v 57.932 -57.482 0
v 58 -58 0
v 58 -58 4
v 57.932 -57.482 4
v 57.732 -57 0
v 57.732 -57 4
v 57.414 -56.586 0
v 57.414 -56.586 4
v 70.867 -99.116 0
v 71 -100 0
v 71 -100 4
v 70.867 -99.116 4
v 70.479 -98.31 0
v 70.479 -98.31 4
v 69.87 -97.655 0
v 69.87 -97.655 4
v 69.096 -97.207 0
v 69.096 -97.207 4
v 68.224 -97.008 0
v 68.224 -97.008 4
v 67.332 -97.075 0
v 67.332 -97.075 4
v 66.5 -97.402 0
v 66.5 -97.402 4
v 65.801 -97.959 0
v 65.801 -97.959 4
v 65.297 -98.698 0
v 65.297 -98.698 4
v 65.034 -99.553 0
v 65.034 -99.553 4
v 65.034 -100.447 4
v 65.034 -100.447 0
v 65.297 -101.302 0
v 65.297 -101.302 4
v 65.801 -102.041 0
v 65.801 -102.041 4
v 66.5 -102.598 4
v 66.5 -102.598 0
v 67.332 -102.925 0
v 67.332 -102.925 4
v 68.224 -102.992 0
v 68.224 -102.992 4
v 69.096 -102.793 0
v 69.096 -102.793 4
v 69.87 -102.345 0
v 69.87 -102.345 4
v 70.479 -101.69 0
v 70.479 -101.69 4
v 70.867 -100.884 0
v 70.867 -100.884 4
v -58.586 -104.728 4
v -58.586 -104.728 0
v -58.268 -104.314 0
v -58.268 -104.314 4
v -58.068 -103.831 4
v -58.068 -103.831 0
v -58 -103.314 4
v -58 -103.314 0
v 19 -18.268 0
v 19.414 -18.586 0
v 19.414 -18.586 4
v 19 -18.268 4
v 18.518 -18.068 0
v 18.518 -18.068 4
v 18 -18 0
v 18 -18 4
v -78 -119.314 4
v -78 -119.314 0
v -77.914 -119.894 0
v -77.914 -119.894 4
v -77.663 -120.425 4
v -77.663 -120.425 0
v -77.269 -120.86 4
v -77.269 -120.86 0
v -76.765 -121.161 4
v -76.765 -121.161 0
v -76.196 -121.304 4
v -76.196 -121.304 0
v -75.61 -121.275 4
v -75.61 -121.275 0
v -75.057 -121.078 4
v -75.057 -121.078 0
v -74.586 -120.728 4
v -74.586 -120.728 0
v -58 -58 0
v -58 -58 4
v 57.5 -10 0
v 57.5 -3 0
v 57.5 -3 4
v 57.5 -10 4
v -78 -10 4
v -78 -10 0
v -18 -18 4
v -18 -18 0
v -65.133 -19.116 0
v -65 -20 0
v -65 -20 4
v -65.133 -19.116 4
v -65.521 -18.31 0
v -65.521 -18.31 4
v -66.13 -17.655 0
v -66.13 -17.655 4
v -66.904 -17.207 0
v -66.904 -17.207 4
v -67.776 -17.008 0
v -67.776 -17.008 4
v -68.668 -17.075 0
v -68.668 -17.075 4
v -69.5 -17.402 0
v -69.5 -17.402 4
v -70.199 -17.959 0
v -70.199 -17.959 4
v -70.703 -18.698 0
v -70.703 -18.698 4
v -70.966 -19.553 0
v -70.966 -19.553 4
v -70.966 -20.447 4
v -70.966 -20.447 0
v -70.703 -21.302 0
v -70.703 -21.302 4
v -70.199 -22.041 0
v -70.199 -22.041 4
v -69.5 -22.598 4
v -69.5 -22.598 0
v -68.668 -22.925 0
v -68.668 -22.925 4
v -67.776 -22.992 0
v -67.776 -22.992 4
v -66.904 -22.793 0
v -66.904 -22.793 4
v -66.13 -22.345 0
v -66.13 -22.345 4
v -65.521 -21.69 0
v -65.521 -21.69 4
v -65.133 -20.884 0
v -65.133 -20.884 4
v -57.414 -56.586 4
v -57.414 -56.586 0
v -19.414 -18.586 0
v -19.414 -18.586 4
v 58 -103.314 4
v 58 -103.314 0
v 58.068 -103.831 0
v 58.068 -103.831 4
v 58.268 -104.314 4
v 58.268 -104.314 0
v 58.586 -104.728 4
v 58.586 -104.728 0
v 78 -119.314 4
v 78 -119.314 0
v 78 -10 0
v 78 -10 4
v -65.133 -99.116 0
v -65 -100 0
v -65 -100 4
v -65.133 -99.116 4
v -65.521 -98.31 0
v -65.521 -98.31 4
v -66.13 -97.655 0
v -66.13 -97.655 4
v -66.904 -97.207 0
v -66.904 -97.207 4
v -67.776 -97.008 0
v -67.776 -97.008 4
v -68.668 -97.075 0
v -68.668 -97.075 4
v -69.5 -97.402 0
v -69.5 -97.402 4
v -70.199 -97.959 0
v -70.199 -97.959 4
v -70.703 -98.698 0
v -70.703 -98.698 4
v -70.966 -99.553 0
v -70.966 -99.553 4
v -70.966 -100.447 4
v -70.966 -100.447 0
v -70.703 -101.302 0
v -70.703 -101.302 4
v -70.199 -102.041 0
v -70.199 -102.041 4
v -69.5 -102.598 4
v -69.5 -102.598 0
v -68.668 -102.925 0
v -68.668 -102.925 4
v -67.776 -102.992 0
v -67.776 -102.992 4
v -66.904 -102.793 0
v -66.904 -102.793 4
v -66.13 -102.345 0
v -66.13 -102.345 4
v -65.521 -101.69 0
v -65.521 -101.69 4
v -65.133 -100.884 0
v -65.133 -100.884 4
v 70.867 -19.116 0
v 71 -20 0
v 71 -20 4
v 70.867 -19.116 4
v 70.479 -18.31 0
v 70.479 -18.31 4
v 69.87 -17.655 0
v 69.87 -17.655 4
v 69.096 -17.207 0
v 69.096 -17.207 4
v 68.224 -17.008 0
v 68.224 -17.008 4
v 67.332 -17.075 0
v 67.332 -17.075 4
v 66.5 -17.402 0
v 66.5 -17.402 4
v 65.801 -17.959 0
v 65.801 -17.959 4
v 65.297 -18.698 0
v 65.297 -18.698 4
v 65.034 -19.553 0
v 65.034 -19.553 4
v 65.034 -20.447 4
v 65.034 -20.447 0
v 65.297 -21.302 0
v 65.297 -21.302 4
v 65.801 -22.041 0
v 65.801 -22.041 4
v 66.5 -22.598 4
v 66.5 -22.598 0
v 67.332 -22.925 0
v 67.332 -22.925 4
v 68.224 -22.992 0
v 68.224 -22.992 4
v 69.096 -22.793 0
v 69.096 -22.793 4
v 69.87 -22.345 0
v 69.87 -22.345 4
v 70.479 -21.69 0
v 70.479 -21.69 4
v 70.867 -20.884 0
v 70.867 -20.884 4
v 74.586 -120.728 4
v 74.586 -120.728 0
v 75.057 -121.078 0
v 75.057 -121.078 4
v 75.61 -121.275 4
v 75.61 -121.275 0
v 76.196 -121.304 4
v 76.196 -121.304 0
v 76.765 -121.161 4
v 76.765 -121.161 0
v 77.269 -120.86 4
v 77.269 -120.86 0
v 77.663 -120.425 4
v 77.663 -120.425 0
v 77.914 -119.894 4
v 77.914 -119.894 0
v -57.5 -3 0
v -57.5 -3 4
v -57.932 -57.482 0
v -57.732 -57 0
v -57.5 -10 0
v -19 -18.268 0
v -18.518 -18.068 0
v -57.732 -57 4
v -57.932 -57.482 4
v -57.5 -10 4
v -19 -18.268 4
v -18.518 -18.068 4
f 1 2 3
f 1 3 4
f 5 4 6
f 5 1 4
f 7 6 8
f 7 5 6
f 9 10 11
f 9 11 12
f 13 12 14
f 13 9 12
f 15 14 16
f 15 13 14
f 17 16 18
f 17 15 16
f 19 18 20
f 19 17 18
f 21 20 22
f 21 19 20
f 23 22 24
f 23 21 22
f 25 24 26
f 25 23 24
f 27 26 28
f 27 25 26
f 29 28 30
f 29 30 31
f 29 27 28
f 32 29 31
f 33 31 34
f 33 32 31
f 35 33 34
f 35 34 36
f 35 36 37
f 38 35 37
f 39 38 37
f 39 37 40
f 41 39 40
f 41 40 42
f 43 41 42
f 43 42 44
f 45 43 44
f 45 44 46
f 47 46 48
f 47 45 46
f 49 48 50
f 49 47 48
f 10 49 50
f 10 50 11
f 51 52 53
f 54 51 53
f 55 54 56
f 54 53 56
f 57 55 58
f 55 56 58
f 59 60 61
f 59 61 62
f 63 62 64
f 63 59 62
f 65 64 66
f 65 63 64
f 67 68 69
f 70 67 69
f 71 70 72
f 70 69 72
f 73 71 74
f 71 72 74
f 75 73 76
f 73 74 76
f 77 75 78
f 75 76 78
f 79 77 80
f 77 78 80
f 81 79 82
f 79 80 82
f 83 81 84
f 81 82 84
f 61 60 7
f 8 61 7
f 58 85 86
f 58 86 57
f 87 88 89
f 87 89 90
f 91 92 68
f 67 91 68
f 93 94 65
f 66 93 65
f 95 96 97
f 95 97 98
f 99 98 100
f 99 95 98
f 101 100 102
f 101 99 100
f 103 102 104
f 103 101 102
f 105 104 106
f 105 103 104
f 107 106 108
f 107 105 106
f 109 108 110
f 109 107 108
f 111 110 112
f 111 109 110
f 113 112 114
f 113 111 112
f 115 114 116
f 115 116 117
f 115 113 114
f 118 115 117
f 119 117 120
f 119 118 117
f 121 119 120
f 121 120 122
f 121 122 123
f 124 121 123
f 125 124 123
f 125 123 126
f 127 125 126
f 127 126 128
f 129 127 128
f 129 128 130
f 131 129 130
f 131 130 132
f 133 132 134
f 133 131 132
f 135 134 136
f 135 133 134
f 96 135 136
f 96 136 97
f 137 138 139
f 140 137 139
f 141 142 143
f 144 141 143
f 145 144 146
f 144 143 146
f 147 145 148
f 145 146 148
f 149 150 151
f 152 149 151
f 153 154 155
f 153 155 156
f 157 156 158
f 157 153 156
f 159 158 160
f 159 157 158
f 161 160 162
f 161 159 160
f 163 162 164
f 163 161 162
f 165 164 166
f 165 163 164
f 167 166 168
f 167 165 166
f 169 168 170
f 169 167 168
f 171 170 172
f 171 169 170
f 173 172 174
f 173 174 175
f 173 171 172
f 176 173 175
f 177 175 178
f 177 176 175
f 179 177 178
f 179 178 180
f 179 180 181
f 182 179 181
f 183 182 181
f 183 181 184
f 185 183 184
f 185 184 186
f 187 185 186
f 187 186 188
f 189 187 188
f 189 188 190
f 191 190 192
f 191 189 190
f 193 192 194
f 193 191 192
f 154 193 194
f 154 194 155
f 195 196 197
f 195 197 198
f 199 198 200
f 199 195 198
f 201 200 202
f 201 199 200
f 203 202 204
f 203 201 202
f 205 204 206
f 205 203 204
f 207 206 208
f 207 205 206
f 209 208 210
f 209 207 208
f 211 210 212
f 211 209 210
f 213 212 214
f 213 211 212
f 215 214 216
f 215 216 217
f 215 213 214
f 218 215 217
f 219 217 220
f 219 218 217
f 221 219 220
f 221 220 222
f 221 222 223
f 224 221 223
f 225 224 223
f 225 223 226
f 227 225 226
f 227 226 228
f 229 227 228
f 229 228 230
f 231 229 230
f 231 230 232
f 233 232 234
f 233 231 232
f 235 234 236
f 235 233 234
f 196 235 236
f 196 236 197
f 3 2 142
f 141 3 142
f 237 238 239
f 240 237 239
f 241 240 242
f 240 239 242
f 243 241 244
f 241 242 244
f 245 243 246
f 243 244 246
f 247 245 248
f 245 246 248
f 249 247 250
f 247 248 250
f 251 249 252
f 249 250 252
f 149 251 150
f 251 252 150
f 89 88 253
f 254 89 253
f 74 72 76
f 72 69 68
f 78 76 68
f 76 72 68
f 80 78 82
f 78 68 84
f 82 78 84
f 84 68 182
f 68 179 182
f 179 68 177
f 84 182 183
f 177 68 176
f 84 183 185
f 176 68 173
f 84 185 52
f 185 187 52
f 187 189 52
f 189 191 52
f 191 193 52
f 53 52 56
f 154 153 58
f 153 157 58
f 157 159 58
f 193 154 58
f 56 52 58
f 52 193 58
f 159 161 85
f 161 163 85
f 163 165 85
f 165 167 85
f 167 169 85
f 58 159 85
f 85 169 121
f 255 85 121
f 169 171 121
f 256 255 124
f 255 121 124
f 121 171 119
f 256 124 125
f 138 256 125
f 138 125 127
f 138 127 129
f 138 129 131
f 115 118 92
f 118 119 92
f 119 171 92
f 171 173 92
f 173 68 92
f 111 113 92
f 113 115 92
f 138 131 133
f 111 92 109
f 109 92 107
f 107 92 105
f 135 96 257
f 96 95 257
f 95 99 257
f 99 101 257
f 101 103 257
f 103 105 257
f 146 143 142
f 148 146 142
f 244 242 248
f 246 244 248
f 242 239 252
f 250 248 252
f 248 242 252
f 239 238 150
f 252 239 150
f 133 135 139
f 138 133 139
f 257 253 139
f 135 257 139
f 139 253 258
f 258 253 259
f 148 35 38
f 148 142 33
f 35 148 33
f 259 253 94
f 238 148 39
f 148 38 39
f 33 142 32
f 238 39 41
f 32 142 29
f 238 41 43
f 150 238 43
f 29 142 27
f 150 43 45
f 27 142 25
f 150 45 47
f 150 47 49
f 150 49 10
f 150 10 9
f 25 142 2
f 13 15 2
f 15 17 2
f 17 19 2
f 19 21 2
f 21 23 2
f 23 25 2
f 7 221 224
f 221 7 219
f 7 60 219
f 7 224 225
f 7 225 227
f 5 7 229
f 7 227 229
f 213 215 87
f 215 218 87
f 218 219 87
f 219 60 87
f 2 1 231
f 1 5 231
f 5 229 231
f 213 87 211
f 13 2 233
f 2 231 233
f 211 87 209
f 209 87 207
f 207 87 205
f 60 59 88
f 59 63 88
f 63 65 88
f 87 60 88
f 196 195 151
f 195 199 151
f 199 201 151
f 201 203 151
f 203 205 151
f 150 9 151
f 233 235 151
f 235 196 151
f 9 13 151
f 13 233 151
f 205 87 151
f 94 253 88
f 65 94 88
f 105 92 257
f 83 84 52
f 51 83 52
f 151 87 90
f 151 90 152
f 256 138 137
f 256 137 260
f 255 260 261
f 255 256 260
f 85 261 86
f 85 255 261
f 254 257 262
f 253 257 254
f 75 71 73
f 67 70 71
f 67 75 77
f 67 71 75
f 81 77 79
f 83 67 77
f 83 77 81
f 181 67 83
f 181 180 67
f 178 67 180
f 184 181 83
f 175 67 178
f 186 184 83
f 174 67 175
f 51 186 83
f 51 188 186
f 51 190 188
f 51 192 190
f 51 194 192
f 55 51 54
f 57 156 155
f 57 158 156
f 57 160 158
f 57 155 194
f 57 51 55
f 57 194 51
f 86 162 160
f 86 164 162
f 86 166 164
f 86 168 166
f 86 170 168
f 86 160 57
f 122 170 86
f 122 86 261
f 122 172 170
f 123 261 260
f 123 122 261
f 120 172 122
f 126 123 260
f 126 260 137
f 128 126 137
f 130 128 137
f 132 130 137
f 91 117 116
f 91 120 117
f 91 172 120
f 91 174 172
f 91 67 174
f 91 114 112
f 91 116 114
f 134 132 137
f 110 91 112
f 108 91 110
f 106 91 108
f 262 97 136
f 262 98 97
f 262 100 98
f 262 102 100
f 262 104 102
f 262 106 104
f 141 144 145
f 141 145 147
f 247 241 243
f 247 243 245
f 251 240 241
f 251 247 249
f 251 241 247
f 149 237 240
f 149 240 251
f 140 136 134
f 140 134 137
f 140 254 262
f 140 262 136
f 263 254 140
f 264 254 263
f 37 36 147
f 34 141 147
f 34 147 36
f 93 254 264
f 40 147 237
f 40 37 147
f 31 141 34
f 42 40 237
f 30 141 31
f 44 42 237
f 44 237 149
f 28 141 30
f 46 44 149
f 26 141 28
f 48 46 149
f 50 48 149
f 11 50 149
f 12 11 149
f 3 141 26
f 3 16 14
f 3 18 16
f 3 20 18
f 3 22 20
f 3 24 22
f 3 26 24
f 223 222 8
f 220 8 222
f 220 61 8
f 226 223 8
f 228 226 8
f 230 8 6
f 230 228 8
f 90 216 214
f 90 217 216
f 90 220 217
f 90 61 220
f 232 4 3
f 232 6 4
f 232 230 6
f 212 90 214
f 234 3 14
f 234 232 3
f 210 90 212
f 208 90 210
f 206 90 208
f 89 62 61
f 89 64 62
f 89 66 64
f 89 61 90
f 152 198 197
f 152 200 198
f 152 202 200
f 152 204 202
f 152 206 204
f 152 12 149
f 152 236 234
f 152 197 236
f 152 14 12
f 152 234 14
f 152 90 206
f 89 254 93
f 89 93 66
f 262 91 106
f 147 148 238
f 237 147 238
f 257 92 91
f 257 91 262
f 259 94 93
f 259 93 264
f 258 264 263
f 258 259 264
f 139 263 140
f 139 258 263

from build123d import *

# Parameters (mm, degrees)
SKETCH_R  = 3
PAD_DEPTH = 4


with BuildPart() as part:
    # Sketch → Pad (new body)
    with BuildSketch(Plane.XY):
        with BuildLine():
            Line((-78, -10), (-78, -119.313708))
            ThreePointArc((-78, -119.313708), (-76.765367, -121.161468), (-74.585786, -120.727922))
            Line((-74.585786, -120.727922), (-58.585786, -104.727922))
            ThreePointArc((-58.585786, -104.727922), (-58.152241, -104.079075), (-58, -103.313708))
            Line((-58, -58), (-58, -103.313708))
            ThreePointArc((-57.414214, -56.585786), (-57.847759, -57.234633), (-58, -58))
            Line((-57.414214, -56.585786), (-19.414214, -18.585786))
            ThreePointArc((-18, -18), (-18.765367, -18.152241), (-19.414214, -18.585786))
            Line((-18, -18), (18, -18))
            ThreePointArc((19.414214, -18.585786), (18.765367, -18.152241), (18, -18))
            Line((19.414214, -18.585786), (57.414214, -56.585786))
            ThreePointArc((58, -58), (57.847759, -57.234633), (57.414214, -56.585786))
            Line((58, -58), (58, -103.313708))
            ThreePointArc((58, -103.313708), (58.152241, -104.079075), (58.585786, -104.727922))
            Line((58.585786, -104.727922), (74.585786, -120.727922))
            ThreePointArc((74.585786, -120.727922), (76.765367, -121.161468), (78, -119.313708))
            Line((78, -119.313708), (78, -10))
            Line((57.5, -10), (78, -10))
            Line((57.5, -3), (57.5, -10))
            Line((57.5, -3), (-57.5, -3))
            Line((-57.5, -10), (-57.5, -3))
            Line((-78, -10), (-57.5, -10))
        make_face()
        with Locations((-68, -100)):
            Circle(SKETCH_R, mode=Mode.SUBTRACT)
        with Locations((68, -100)):
            Circle(SKETCH_R, mode=Mode.SUBTRACT)
        with Locations((-68, -20)):
            Circle(SKETCH_R, mode=Mode.SUBTRACT)
        with Locations((68, -20)):
            Circle(SKETCH_R, mode=Mode.SUBTRACT)
    extrude(amount=PAD_DEPTH)


solid = part.part
